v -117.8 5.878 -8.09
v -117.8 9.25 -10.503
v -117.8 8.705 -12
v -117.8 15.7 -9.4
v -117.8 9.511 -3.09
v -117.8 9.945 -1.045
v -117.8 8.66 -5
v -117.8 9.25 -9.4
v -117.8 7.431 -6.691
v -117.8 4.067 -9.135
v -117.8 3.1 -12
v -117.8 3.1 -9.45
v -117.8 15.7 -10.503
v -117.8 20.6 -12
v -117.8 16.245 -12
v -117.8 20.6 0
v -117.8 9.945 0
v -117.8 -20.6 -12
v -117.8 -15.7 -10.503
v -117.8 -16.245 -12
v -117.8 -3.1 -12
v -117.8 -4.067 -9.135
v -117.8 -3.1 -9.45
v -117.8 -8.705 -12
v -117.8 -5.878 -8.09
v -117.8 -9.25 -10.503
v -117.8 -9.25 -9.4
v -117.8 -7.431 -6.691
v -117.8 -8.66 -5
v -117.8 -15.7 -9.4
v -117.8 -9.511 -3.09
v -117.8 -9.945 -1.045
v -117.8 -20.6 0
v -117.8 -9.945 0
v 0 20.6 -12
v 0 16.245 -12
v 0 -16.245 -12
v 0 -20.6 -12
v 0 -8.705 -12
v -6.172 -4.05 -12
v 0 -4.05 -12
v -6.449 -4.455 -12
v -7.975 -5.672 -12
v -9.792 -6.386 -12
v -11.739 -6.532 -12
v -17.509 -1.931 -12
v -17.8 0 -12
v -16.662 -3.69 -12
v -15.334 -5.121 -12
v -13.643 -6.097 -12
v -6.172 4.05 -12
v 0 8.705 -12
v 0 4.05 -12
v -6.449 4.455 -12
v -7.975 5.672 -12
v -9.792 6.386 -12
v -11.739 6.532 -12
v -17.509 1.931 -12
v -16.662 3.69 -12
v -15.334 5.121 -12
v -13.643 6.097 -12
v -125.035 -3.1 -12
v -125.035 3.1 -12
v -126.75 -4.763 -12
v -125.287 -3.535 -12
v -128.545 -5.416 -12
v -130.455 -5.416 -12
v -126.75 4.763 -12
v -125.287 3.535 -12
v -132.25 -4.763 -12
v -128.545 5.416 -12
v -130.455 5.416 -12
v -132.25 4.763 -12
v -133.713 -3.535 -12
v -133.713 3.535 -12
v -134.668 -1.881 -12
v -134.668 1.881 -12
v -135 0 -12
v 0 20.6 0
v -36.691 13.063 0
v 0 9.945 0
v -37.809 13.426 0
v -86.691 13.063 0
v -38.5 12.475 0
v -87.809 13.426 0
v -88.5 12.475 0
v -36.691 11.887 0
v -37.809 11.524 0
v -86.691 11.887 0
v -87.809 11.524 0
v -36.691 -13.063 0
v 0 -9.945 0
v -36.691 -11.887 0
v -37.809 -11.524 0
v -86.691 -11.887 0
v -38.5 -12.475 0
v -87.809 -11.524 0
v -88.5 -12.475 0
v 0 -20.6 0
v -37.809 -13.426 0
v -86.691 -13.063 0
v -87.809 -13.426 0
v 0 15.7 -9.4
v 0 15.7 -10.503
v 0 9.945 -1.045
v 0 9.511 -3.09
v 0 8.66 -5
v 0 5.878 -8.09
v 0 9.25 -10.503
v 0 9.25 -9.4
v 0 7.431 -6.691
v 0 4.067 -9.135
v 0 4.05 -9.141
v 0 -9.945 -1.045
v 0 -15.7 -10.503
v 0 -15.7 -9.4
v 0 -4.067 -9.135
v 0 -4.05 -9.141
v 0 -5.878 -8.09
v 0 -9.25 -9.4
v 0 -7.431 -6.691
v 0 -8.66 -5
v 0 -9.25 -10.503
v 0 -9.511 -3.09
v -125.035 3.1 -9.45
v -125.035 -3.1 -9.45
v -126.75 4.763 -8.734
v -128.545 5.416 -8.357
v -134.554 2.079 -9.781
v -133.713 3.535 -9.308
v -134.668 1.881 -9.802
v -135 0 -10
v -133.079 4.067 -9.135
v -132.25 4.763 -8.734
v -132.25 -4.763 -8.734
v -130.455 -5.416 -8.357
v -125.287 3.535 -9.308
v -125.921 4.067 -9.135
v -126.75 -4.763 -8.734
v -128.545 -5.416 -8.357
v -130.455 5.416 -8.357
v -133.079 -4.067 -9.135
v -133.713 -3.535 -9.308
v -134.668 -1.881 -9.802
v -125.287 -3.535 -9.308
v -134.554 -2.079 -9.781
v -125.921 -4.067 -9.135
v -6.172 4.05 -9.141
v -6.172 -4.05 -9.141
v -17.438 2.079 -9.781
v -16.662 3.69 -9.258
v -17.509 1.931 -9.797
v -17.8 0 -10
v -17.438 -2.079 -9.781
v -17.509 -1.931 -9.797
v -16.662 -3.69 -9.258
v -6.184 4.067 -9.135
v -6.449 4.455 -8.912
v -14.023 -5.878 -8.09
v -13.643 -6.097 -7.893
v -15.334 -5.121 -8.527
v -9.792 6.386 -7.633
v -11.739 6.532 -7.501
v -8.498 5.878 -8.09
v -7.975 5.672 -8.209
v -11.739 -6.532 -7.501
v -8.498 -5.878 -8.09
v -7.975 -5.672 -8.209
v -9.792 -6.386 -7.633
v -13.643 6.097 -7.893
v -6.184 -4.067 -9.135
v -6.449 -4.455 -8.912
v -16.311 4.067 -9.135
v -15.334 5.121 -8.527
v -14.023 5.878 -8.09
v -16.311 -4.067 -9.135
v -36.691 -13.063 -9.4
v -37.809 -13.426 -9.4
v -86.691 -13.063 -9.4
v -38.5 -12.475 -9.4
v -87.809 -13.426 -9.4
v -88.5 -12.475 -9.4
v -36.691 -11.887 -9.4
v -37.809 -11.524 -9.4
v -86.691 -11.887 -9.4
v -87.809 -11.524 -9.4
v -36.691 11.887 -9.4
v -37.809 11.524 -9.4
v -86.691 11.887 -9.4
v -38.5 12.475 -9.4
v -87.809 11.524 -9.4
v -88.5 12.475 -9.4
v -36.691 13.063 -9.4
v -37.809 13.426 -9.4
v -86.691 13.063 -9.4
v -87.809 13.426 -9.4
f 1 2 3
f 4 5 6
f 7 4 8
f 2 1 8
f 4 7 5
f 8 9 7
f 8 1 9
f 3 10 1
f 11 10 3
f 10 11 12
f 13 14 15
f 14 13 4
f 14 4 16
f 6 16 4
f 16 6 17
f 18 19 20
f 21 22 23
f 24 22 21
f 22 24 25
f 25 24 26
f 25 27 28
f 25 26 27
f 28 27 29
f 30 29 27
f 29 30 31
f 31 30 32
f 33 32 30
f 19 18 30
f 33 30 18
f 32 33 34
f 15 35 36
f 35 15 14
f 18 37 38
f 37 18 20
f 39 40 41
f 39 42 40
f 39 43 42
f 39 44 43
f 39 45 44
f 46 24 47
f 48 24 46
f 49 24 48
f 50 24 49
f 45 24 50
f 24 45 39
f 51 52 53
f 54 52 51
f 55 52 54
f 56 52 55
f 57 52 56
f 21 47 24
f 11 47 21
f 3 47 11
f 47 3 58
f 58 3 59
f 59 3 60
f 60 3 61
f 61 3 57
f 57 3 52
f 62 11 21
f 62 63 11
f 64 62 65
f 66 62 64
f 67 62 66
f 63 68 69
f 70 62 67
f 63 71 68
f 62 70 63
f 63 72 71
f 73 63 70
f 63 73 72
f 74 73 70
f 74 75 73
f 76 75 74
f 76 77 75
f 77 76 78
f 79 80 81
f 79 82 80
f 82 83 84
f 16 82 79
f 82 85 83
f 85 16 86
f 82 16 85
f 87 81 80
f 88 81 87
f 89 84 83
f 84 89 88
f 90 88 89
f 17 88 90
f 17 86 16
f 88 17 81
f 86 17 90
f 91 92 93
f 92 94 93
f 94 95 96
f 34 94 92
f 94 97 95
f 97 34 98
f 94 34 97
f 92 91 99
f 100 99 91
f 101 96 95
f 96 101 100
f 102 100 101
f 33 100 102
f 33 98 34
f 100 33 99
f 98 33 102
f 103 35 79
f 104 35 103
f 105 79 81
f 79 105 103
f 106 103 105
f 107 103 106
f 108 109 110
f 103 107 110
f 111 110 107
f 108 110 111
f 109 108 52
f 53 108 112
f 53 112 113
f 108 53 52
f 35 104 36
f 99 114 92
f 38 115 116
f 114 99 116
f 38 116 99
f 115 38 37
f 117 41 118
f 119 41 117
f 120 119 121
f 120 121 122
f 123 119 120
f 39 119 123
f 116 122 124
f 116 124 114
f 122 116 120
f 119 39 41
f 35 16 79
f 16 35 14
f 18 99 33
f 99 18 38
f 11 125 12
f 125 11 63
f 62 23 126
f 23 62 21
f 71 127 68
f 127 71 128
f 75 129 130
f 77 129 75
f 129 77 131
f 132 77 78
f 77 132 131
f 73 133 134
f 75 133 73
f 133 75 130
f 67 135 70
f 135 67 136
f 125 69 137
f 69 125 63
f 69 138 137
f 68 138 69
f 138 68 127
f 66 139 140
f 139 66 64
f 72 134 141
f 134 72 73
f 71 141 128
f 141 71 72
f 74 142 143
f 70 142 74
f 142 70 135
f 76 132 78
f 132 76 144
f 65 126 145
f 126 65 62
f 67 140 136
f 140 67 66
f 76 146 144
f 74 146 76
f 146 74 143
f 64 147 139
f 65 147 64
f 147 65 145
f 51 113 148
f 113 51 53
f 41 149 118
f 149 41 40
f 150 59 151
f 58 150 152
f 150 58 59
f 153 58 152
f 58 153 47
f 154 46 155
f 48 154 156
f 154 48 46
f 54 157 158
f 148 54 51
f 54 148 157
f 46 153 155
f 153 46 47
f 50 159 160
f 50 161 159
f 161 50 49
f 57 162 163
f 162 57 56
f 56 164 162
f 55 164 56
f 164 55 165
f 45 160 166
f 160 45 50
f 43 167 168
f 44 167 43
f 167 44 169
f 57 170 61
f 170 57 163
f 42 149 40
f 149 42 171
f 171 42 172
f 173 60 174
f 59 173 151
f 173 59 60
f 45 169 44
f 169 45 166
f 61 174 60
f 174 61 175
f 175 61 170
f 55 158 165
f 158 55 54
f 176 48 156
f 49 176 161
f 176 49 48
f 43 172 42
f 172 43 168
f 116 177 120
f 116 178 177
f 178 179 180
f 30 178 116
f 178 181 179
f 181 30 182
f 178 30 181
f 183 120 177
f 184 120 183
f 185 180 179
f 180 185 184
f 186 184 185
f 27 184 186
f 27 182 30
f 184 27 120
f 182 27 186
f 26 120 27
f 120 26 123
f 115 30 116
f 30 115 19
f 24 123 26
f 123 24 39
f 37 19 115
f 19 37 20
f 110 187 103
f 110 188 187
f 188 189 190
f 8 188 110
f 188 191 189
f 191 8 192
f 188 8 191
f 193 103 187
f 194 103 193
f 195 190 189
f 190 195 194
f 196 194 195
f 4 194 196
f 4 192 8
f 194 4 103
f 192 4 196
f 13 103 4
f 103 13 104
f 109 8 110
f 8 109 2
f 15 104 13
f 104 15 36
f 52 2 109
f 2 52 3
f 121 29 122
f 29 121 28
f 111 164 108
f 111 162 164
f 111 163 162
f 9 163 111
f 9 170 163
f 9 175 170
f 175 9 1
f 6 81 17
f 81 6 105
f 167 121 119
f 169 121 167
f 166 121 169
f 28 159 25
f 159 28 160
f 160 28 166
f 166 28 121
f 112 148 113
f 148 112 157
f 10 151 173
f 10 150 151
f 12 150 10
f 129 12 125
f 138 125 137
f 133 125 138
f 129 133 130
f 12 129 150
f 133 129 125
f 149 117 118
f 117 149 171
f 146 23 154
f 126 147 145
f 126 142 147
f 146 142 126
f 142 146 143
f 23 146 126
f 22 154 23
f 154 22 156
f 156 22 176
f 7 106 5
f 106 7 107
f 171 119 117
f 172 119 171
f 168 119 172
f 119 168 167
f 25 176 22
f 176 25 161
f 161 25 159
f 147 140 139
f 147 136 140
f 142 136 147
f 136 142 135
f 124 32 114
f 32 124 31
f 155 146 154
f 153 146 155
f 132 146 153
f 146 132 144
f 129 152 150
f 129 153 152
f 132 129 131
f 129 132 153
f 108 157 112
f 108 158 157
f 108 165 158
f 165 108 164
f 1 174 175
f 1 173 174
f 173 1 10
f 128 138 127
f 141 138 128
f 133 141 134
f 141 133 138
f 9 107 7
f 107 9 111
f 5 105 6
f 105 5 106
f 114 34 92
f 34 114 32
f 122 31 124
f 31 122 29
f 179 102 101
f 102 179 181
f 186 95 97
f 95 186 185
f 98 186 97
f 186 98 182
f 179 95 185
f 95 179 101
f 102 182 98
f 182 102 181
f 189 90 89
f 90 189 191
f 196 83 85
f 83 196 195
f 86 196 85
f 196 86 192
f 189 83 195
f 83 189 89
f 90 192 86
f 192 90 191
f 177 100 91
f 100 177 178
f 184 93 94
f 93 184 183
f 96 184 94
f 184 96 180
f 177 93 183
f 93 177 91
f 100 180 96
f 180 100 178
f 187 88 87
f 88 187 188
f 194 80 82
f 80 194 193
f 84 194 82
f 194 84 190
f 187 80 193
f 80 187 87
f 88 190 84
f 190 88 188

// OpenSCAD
track_width = 41.2;
rail_width = 6.45;
rail_spacing = 12.475;
//rail_inner = 18.5;
//rail_outer = 31.4;

track_thickness = 12.0;
rail_depth = 2.6;

female_width = 7.4 + 0.2+0.5;
female_length = 7.0;
female_diameter = 12.4 + 0.2+0.5;
female_depth = 17.8;

male_width = 6.2;
male_diameter = 11.0;
male_depth = 17.2;

module track_connection(track_length, track_with, connect_width, connect_diameter, connect_depth)
{
  //create the extra track length the rails are not removed here
  translate([track_length/2,0,track_thickness/2]) cube([track_length, track_with, track_thickness],center=true);
  //create the neck that extends to the center of the cylinder
  neck_length = connect_depth - connect_diameter/2;
  translate([track_length+neck_length/2,0,track_thickness/2]) cube([neck_length, connect_width, track_thickness],center=true);
  //create the locking cylinder
  translate([track_length+neck_length,0,track_thickness/2]) cylinder(track_thickness,connect_diameter/2,connect_diameter/2,center=true);
}

module track_grove(length)
{
  translate([length/2,0,track_thickness-rail_depth/2]) cube([length, rail_width, rail_depth],center=true);
  translate([length/2,rail_width/3,track_thickness-rail_depth/4]) rotate([70,0,0]) cube([length, rail_depth, rail_depth],center=true);
  translate([length/2,-rail_width/3,track_thickness-rail_depth/4]) rotate([-70,0,0]) cube([length, rail_depth, rail_depth],center=true);
}

female_offset = 5;
extra_length = 100.0;
extra_width = 25.0;

cutout_diameter=20;

nail_diameter=2;
nail_spacing1=20;
nail_spacing2=30;

module track_base(female_offset1 = 0)
{
  difference()
  {
    union()
    {
      // create the male track connect piece
      track_connection(extra_length+female_depth+female_offset1,
        track_width,
        male_width,
        male_diameter,
        male_depth);
    }
    // subtract out the female connection, and the track groves
    union()
    {
      track_connection(female_offset1,
        track_width+extra_width,
        female_width,
        female_diameter,
        female_depth);
      translate([0,-rail_spacing,0]) track_grove(extra_length+female_depth+female_offset1);
      translate([0,rail_spacing,0]) track_grove(extra_length+female_depth+female_offset1);
      
      cutout_length= extra_length+female_depth+female_offset1+male_depth;
      translate([cutout_length/2,0,0]) rotate([0,90,0]) cylinder(cutout_length,cutout_diameter/2,cutout_diameter/2,center=true);
      
      translate([cutout_length/2+nail_spacing1,-rail_spacing,0]) cylinder(30,nail_diameter/2,nail_diameter/2,center=true);
      translate([cutout_length/2+nail_spacing1,rail_spacing,0]) cylinder(30,nail_diameter/2,nail_diameter/2,center=true);
      translate([cutout_length/2-nail_spacing2,-rail_spacing,0]) cylinder(30,nail_diameter/2,nail_diameter/2,center=true);
      translate([cutout_length/2-nail_spacing2,rail_spacing,0]) cylinder(30,nail_diameter/2,nail_diameter/2,center=true);
      
    }
  }
}

module side_bracing(height, length, thickness, frame_thickness)
{
  //echo(height=height,length=length,thickness=thickness,frame_thickness=frame_thickness);
  //outer frame
  translate([frame_thickness/2,0,height/2]) cube([frame_thickness, thickness, height],center=true);
  //translate([length-frame_thickness/2,0,height/2]) cube([frame_thickness, thickness, height],center=true);
  translate([length/2,0,frame_thickness/2]) cube([length, thickness, frame_thickness],center=true);
  translate([length/2,0,height-frame_thickness/2]) cube([length, thickness, frame_thickness],center=true);
  //a bit tired, this is ugly sorry
  cb_shift = 0.72;
  cb_angle = 50;
  cb_length = height*0.745;
  translate([length/2,0,height*cb_shift]) rotate([0,cb_angle,0]) cube([frame_thickness, thickness, cb_length],center=true);
  translate([length/2,0,height*cb_shift]) rotate([0,-cb_angle,0]) cube([frame_thickness, thickness, cb_length],center=true);
  translate([length/2,0,height*(1-cb_shift)]) rotate([0,cb_angle,0]) cube([frame_thickness, thickness, cb_length],center=true);
  translate([length/2,0,height*(1-cb_shift)]) rotate([0,-cb_angle,0]) cube([frame_thickness, thickness, cb_length],center=true);
  
}

rotate([0,180,0])track_base();
 
